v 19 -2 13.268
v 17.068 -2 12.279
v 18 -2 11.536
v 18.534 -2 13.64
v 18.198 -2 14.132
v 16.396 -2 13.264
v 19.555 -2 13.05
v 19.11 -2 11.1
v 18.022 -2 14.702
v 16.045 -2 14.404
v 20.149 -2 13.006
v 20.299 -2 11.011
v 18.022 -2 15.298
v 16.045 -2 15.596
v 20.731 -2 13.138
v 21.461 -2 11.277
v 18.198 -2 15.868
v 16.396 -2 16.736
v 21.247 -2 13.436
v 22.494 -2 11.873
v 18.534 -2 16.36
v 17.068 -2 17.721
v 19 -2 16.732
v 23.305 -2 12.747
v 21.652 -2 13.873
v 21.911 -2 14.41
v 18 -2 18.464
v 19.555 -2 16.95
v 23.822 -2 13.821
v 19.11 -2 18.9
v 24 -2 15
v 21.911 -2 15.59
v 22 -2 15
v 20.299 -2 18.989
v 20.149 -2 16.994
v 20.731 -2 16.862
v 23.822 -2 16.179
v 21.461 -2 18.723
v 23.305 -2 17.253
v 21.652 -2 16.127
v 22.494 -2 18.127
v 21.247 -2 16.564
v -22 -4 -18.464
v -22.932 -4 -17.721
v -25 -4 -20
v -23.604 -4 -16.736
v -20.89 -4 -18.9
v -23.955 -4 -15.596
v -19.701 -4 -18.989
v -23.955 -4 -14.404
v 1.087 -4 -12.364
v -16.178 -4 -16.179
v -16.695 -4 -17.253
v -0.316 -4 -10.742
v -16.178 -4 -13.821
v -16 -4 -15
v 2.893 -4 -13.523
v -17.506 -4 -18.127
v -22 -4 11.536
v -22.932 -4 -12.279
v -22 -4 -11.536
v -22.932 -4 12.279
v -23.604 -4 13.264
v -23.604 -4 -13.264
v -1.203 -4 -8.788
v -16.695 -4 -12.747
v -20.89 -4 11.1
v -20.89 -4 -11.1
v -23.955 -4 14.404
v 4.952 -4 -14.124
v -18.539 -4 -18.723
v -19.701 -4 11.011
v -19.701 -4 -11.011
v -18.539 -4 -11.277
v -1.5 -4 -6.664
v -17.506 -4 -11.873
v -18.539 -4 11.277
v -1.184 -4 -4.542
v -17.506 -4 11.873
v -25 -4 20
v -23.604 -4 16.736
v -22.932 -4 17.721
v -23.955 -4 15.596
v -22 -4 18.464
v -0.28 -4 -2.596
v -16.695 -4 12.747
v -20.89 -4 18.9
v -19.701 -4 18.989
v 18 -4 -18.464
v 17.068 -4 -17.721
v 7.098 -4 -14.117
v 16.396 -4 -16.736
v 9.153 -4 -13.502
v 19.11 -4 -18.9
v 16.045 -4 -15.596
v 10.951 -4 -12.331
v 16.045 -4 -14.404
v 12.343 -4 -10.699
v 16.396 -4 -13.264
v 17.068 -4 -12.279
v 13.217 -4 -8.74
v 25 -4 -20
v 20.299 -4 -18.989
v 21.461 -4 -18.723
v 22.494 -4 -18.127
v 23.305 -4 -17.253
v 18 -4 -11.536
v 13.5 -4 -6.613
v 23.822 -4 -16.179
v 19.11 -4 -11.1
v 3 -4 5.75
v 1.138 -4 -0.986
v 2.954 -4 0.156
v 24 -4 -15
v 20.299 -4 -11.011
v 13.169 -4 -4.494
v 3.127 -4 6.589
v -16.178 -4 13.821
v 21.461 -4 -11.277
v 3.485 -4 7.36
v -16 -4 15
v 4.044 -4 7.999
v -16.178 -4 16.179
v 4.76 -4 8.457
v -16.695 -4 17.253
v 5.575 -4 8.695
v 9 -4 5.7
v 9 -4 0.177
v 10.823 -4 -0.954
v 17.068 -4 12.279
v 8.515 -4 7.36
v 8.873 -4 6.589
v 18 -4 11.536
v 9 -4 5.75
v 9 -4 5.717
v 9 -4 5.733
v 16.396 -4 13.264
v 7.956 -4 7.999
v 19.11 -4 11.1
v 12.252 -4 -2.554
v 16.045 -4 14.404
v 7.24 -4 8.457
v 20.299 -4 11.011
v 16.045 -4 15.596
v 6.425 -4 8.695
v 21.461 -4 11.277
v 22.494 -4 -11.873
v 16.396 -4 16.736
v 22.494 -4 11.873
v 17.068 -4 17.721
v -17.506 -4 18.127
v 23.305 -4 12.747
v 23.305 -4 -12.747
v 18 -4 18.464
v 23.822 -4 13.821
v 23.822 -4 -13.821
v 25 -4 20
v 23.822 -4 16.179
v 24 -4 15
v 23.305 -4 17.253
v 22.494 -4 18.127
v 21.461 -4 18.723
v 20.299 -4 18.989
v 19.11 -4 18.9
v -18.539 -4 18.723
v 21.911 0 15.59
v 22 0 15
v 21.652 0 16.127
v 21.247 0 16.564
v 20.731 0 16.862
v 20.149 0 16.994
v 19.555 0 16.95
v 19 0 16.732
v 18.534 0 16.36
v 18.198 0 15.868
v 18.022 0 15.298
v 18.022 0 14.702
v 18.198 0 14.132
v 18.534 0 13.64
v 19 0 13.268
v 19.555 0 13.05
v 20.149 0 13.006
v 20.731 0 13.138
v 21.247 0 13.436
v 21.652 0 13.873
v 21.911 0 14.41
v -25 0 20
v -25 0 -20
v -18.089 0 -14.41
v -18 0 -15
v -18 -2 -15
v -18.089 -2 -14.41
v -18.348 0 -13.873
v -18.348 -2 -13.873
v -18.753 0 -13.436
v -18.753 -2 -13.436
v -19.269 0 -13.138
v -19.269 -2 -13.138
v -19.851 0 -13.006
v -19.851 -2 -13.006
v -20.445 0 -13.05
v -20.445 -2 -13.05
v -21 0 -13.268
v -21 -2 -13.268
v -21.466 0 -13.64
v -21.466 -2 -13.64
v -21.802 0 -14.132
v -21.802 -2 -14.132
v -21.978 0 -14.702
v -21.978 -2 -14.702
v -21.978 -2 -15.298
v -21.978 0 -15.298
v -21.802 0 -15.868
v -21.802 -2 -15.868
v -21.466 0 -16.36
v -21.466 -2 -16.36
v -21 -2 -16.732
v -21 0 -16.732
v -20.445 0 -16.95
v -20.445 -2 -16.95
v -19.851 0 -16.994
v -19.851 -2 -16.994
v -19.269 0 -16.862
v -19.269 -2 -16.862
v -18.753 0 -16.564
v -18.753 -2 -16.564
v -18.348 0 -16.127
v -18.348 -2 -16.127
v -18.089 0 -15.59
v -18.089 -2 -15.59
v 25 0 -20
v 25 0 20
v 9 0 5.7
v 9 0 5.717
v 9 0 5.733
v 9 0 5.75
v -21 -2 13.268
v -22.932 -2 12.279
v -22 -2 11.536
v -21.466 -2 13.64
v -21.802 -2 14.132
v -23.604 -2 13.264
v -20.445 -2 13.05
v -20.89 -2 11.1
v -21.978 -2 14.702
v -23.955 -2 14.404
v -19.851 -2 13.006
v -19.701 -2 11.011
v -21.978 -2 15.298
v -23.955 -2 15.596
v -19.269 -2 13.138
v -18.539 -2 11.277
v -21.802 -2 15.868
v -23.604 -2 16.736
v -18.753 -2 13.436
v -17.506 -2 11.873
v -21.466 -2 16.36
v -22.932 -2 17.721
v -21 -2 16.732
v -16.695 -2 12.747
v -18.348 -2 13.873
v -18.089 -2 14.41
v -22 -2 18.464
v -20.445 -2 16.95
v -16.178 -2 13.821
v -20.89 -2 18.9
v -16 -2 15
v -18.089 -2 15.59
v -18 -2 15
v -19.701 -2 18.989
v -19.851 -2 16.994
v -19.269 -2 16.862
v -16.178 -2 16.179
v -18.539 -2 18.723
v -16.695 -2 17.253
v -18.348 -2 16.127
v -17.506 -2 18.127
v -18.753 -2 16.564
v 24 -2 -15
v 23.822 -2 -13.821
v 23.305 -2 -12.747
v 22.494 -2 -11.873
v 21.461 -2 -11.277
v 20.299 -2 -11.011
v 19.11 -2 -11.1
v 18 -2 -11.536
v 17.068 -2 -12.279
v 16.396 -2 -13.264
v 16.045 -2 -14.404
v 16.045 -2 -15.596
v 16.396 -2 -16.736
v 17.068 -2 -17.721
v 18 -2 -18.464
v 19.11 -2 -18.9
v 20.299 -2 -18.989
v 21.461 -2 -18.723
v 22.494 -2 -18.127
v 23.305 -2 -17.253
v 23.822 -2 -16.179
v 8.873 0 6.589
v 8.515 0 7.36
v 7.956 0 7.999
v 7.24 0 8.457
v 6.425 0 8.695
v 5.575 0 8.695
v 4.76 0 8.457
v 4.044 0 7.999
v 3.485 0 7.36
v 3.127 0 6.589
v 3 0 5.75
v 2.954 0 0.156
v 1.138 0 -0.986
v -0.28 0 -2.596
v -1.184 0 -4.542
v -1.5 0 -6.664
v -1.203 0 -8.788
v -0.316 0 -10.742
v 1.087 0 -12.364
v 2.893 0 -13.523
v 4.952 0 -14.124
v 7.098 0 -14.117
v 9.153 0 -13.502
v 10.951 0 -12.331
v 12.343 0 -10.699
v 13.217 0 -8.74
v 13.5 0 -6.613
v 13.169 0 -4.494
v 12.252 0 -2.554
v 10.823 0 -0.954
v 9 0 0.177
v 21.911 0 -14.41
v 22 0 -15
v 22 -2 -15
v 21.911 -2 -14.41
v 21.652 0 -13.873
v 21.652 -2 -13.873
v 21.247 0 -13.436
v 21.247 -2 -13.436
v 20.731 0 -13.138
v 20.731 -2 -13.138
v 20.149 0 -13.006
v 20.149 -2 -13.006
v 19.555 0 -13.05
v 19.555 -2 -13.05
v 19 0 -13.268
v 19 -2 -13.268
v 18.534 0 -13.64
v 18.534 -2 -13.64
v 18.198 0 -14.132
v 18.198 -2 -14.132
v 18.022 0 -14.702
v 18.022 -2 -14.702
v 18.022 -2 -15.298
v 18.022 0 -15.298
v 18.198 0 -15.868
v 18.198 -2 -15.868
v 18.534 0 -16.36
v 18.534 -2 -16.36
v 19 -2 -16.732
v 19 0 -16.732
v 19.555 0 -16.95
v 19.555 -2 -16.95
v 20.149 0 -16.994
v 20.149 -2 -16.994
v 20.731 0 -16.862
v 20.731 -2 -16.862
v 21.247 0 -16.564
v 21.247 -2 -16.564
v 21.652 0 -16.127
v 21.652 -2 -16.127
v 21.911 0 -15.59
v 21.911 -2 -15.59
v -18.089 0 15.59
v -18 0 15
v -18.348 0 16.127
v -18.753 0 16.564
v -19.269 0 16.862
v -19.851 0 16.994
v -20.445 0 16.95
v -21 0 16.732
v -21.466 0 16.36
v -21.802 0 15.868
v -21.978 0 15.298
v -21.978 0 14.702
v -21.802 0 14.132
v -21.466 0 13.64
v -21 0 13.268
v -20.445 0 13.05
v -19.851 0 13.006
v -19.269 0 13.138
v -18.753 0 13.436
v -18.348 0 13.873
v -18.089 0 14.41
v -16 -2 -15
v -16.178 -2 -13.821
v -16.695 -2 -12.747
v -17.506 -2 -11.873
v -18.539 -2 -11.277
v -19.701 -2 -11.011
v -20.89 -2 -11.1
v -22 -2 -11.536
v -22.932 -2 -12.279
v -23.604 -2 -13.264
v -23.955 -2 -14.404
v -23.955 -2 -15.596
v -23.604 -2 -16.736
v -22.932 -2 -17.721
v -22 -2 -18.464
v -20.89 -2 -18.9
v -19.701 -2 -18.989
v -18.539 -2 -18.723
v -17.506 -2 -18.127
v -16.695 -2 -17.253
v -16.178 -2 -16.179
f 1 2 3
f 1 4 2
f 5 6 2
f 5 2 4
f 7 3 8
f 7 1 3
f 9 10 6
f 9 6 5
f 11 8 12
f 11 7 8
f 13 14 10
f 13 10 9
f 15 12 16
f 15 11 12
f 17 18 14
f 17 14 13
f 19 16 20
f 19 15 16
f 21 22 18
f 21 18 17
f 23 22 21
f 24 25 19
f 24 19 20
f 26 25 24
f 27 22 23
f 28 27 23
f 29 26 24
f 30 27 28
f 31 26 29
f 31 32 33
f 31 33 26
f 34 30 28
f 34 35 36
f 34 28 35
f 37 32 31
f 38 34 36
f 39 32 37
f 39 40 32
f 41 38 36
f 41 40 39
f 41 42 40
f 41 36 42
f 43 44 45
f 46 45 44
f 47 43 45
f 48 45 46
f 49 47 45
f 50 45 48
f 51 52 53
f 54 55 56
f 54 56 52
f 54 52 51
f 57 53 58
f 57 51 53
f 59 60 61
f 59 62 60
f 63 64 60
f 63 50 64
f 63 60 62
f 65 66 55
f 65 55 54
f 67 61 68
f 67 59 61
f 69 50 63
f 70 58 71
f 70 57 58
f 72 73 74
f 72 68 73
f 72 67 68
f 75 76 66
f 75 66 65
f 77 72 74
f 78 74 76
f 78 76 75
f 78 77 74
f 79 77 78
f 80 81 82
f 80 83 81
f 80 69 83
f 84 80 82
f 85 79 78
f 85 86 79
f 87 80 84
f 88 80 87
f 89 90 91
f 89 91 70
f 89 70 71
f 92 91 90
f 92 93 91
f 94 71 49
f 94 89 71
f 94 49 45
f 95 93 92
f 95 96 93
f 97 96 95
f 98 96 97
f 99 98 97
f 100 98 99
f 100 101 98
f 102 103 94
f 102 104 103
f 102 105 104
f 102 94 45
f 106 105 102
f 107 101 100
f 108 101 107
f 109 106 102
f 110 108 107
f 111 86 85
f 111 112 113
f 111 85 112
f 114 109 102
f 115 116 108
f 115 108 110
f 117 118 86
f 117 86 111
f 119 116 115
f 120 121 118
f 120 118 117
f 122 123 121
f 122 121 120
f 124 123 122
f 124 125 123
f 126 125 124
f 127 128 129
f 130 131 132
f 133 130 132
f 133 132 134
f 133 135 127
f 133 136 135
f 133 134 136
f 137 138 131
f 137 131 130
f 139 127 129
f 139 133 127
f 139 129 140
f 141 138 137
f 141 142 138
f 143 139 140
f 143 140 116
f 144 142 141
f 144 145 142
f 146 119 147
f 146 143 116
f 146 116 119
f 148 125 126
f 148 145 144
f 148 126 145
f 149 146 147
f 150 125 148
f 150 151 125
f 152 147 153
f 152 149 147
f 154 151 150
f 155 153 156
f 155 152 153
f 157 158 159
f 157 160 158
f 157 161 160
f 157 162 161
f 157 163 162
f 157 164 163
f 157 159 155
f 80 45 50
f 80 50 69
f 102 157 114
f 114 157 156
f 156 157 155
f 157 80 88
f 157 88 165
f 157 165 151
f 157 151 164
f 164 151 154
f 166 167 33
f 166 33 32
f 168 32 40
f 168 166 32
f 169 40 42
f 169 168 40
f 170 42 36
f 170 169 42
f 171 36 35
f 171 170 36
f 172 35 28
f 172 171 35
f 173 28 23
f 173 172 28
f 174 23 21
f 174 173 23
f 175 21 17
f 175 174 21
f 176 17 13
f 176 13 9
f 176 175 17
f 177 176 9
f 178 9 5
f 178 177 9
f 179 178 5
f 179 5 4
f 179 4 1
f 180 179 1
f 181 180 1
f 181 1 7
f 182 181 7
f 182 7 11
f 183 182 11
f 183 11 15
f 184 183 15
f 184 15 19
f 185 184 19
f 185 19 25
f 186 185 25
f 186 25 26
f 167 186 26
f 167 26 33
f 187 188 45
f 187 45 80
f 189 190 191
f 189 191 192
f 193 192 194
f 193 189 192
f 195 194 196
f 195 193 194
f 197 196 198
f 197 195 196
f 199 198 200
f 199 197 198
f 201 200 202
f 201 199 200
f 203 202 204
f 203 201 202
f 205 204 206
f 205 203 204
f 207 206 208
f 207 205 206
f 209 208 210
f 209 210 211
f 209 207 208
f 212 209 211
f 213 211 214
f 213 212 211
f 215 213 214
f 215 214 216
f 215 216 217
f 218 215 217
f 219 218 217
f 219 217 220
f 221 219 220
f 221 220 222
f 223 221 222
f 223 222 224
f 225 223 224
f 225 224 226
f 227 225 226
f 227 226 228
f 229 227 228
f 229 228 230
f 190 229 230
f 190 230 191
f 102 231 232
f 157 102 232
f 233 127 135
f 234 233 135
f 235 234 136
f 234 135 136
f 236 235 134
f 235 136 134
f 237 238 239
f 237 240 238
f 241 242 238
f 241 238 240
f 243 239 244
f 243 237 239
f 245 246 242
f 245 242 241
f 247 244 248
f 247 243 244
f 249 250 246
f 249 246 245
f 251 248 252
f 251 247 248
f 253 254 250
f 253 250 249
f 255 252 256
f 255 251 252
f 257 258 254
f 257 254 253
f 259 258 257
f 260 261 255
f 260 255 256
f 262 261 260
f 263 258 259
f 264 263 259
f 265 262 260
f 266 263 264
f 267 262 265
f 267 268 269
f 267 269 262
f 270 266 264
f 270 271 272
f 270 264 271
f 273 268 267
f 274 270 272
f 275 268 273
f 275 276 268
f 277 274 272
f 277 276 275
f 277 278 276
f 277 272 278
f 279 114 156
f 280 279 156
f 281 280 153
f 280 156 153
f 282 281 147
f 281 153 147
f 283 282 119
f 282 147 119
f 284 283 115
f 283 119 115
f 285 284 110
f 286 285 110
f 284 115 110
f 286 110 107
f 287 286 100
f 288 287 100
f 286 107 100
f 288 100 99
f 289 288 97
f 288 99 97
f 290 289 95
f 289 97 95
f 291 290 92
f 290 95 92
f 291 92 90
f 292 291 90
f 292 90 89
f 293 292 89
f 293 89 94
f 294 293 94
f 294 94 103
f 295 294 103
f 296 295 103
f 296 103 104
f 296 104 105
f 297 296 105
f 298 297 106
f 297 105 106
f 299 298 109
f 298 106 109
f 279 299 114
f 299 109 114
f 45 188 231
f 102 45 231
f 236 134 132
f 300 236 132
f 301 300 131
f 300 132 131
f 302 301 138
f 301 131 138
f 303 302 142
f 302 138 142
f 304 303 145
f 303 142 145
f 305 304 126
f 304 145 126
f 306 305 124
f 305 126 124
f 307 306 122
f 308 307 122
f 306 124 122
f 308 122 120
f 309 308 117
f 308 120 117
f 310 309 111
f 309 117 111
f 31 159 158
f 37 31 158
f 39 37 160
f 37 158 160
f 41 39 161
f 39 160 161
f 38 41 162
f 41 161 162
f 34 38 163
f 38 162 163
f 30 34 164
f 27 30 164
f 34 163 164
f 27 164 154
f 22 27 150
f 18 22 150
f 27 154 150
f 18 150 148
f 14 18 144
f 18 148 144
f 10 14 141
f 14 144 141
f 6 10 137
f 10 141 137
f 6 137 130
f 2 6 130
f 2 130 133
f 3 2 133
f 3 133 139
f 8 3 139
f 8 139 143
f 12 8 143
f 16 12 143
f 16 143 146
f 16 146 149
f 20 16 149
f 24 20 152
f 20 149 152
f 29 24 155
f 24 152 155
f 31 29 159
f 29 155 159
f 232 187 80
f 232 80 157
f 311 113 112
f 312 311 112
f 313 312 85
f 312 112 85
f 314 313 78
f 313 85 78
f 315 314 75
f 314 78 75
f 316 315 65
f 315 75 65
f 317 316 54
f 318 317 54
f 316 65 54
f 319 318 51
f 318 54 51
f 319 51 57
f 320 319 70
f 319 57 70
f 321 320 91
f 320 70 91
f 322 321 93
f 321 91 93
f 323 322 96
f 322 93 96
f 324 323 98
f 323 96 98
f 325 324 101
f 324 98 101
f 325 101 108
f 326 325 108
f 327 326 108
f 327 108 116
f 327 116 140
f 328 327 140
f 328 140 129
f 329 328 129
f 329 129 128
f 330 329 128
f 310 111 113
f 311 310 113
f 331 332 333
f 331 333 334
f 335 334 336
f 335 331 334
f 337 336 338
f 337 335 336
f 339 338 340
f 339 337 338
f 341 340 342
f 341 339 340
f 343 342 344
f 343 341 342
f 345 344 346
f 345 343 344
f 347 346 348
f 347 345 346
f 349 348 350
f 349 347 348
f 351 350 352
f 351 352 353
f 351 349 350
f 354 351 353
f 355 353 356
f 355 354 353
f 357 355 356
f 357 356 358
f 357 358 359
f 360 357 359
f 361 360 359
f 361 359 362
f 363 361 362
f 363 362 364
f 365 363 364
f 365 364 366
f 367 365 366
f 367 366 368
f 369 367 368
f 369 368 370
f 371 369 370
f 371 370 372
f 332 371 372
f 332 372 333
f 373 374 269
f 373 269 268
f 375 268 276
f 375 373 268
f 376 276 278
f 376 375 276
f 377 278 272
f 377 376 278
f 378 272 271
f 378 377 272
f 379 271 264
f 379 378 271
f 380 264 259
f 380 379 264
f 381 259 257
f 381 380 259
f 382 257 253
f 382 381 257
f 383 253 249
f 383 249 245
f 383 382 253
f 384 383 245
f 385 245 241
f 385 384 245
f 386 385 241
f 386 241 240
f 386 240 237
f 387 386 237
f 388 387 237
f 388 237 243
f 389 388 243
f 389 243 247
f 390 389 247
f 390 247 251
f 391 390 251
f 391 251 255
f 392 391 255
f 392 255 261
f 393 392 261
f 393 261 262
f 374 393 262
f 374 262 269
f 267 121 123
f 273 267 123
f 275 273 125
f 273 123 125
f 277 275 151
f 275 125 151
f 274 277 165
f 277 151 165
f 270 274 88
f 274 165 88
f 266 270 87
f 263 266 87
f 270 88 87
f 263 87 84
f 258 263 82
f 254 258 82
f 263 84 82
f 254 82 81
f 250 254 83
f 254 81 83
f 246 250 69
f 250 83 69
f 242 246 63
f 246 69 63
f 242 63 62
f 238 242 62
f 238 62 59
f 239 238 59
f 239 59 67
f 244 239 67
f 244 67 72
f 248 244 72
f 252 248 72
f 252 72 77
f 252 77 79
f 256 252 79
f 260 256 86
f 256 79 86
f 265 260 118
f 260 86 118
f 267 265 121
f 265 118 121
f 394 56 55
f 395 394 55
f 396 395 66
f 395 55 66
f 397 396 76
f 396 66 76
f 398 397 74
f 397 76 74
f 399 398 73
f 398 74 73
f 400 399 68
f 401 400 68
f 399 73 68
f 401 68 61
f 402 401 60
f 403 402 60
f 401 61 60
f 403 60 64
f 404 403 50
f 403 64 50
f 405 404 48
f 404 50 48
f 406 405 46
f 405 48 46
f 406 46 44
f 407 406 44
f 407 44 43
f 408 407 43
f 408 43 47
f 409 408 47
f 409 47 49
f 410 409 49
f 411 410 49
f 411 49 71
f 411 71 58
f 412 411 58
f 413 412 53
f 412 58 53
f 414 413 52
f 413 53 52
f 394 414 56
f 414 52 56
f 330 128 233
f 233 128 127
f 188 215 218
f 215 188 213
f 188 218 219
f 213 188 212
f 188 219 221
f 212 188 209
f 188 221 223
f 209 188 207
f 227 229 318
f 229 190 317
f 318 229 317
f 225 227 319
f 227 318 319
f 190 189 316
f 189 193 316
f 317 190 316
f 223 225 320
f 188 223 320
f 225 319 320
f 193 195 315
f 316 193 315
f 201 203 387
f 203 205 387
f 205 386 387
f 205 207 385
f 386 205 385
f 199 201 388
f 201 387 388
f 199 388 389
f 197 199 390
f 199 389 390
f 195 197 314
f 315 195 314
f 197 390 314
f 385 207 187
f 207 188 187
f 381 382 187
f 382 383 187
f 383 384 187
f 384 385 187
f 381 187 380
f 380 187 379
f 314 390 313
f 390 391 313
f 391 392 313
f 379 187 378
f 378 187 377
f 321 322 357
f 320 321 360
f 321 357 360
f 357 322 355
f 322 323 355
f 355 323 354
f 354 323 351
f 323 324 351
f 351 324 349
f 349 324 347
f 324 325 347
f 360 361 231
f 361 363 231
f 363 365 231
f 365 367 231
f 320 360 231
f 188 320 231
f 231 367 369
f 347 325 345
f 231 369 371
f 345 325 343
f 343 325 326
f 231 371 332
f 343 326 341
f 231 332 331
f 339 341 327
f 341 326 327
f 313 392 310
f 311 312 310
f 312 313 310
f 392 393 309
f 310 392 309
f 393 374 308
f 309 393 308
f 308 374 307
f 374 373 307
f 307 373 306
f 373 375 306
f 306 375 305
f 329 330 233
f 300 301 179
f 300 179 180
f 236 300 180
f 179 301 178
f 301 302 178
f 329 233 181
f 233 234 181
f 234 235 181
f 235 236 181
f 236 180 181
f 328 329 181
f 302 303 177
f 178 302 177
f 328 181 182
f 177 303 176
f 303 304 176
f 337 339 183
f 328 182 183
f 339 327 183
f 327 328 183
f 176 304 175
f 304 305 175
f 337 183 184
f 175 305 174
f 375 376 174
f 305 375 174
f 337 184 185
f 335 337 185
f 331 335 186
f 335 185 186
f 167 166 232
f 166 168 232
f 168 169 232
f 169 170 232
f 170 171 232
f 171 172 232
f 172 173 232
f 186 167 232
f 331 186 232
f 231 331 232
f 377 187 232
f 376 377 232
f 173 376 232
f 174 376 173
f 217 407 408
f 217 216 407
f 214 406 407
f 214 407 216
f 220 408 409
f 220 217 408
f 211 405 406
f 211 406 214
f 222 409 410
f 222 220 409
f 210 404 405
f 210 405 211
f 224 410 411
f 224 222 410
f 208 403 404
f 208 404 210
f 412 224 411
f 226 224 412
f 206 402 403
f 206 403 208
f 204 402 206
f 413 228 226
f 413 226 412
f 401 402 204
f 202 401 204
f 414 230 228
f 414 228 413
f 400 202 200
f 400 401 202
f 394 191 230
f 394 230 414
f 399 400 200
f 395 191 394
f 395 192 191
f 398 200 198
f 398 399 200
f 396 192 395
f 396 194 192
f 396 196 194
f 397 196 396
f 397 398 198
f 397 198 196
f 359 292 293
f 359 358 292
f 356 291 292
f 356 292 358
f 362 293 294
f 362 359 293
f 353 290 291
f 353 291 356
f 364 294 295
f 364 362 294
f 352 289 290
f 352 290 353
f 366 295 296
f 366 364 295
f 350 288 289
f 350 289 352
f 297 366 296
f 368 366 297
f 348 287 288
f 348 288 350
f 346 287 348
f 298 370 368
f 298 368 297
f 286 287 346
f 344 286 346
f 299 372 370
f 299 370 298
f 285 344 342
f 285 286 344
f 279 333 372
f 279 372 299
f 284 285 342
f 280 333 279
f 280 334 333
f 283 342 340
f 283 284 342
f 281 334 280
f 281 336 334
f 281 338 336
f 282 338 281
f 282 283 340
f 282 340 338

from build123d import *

# Parameters (mm, degrees)
F0_W     = 50
F0_H     = 40
F0_R     = 2
F1_DEPTH = 4
F2_R     = 4
F2_R_2   = 2
F3_DEPTH = 2
F5_DEPTH = 25


with BuildPart() as f1:
    # F0 (on Front) → F1 (new body)
    with BuildSketch(Plane.XZ):
        Rectangle(F0_W, F0_H)
        with Locations((-20, -15)):
            Circle(F0_R, mode=Mode.SUBTRACT)
        with Locations((20, -15)):
            Circle(F0_R, mode=Mode.SUBTRACT)
        with Locations((-20, 15)):
            Circle(F0_R, mode=Mode.SUBTRACT)
        with Locations((20, 15)):
            Circle(F0_R, mode=Mode.SUBTRACT)
    extrude(amount=F1_DEPTH)

    # F2 (on face) → F3 (cut)
    with BuildSketch(Plane.XZ.offset(4)):
        with Locations((-20, 15)):
            Circle(F2_R)
        with Locations((-20, 15)):
            Circle(F2_R_2, mode=Mode.SUBTRACT)
        with Locations((20, 15)):
            Circle(F2_R)
        with Locations((20, 15)):
            Circle(F2_R_2, mode=Mode.SUBTRACT)
        with Locations((20, -15)):
            Circle(F2_R)
        with Locations((20, -15)):
            Circle(F2_R_2, mode=Mode.SUBTRACT)
        with Locations((-20, -15)):
            Circle(F2_R)
        with Locations((-20, -15)):
            Circle(F2_R_2, mode=Mode.SUBTRACT)
    extrude(amount=-F3_DEPTH, mode=Mode.SUBTRACT)

    # F4 (on face) → F5 (cut)
    with BuildSketch(Plane.XZ.offset(4)):
        with BuildLine():
            Line((3.000102, 5.749591), (2.953973, 0.156237))
            ThreePointArc((2.953973, 0.156237), (6.025203, -14.197312), (8.999898, 0.176554))
            Line((8.999898, 0.176554), (8.999898, 5.70011))
            ThreePointArc((8.999898, 5.70011), (9, 5.724851), (8.999898, 5.749591))
            ThreePointArc((8.999898, 5.749591), (6, 8.724851), (3.000102, 5.749591))
        make_face()
    extrude(amount=-F5_DEPTH, mode=Mode.SUBTRACT)


solid = f1.part
